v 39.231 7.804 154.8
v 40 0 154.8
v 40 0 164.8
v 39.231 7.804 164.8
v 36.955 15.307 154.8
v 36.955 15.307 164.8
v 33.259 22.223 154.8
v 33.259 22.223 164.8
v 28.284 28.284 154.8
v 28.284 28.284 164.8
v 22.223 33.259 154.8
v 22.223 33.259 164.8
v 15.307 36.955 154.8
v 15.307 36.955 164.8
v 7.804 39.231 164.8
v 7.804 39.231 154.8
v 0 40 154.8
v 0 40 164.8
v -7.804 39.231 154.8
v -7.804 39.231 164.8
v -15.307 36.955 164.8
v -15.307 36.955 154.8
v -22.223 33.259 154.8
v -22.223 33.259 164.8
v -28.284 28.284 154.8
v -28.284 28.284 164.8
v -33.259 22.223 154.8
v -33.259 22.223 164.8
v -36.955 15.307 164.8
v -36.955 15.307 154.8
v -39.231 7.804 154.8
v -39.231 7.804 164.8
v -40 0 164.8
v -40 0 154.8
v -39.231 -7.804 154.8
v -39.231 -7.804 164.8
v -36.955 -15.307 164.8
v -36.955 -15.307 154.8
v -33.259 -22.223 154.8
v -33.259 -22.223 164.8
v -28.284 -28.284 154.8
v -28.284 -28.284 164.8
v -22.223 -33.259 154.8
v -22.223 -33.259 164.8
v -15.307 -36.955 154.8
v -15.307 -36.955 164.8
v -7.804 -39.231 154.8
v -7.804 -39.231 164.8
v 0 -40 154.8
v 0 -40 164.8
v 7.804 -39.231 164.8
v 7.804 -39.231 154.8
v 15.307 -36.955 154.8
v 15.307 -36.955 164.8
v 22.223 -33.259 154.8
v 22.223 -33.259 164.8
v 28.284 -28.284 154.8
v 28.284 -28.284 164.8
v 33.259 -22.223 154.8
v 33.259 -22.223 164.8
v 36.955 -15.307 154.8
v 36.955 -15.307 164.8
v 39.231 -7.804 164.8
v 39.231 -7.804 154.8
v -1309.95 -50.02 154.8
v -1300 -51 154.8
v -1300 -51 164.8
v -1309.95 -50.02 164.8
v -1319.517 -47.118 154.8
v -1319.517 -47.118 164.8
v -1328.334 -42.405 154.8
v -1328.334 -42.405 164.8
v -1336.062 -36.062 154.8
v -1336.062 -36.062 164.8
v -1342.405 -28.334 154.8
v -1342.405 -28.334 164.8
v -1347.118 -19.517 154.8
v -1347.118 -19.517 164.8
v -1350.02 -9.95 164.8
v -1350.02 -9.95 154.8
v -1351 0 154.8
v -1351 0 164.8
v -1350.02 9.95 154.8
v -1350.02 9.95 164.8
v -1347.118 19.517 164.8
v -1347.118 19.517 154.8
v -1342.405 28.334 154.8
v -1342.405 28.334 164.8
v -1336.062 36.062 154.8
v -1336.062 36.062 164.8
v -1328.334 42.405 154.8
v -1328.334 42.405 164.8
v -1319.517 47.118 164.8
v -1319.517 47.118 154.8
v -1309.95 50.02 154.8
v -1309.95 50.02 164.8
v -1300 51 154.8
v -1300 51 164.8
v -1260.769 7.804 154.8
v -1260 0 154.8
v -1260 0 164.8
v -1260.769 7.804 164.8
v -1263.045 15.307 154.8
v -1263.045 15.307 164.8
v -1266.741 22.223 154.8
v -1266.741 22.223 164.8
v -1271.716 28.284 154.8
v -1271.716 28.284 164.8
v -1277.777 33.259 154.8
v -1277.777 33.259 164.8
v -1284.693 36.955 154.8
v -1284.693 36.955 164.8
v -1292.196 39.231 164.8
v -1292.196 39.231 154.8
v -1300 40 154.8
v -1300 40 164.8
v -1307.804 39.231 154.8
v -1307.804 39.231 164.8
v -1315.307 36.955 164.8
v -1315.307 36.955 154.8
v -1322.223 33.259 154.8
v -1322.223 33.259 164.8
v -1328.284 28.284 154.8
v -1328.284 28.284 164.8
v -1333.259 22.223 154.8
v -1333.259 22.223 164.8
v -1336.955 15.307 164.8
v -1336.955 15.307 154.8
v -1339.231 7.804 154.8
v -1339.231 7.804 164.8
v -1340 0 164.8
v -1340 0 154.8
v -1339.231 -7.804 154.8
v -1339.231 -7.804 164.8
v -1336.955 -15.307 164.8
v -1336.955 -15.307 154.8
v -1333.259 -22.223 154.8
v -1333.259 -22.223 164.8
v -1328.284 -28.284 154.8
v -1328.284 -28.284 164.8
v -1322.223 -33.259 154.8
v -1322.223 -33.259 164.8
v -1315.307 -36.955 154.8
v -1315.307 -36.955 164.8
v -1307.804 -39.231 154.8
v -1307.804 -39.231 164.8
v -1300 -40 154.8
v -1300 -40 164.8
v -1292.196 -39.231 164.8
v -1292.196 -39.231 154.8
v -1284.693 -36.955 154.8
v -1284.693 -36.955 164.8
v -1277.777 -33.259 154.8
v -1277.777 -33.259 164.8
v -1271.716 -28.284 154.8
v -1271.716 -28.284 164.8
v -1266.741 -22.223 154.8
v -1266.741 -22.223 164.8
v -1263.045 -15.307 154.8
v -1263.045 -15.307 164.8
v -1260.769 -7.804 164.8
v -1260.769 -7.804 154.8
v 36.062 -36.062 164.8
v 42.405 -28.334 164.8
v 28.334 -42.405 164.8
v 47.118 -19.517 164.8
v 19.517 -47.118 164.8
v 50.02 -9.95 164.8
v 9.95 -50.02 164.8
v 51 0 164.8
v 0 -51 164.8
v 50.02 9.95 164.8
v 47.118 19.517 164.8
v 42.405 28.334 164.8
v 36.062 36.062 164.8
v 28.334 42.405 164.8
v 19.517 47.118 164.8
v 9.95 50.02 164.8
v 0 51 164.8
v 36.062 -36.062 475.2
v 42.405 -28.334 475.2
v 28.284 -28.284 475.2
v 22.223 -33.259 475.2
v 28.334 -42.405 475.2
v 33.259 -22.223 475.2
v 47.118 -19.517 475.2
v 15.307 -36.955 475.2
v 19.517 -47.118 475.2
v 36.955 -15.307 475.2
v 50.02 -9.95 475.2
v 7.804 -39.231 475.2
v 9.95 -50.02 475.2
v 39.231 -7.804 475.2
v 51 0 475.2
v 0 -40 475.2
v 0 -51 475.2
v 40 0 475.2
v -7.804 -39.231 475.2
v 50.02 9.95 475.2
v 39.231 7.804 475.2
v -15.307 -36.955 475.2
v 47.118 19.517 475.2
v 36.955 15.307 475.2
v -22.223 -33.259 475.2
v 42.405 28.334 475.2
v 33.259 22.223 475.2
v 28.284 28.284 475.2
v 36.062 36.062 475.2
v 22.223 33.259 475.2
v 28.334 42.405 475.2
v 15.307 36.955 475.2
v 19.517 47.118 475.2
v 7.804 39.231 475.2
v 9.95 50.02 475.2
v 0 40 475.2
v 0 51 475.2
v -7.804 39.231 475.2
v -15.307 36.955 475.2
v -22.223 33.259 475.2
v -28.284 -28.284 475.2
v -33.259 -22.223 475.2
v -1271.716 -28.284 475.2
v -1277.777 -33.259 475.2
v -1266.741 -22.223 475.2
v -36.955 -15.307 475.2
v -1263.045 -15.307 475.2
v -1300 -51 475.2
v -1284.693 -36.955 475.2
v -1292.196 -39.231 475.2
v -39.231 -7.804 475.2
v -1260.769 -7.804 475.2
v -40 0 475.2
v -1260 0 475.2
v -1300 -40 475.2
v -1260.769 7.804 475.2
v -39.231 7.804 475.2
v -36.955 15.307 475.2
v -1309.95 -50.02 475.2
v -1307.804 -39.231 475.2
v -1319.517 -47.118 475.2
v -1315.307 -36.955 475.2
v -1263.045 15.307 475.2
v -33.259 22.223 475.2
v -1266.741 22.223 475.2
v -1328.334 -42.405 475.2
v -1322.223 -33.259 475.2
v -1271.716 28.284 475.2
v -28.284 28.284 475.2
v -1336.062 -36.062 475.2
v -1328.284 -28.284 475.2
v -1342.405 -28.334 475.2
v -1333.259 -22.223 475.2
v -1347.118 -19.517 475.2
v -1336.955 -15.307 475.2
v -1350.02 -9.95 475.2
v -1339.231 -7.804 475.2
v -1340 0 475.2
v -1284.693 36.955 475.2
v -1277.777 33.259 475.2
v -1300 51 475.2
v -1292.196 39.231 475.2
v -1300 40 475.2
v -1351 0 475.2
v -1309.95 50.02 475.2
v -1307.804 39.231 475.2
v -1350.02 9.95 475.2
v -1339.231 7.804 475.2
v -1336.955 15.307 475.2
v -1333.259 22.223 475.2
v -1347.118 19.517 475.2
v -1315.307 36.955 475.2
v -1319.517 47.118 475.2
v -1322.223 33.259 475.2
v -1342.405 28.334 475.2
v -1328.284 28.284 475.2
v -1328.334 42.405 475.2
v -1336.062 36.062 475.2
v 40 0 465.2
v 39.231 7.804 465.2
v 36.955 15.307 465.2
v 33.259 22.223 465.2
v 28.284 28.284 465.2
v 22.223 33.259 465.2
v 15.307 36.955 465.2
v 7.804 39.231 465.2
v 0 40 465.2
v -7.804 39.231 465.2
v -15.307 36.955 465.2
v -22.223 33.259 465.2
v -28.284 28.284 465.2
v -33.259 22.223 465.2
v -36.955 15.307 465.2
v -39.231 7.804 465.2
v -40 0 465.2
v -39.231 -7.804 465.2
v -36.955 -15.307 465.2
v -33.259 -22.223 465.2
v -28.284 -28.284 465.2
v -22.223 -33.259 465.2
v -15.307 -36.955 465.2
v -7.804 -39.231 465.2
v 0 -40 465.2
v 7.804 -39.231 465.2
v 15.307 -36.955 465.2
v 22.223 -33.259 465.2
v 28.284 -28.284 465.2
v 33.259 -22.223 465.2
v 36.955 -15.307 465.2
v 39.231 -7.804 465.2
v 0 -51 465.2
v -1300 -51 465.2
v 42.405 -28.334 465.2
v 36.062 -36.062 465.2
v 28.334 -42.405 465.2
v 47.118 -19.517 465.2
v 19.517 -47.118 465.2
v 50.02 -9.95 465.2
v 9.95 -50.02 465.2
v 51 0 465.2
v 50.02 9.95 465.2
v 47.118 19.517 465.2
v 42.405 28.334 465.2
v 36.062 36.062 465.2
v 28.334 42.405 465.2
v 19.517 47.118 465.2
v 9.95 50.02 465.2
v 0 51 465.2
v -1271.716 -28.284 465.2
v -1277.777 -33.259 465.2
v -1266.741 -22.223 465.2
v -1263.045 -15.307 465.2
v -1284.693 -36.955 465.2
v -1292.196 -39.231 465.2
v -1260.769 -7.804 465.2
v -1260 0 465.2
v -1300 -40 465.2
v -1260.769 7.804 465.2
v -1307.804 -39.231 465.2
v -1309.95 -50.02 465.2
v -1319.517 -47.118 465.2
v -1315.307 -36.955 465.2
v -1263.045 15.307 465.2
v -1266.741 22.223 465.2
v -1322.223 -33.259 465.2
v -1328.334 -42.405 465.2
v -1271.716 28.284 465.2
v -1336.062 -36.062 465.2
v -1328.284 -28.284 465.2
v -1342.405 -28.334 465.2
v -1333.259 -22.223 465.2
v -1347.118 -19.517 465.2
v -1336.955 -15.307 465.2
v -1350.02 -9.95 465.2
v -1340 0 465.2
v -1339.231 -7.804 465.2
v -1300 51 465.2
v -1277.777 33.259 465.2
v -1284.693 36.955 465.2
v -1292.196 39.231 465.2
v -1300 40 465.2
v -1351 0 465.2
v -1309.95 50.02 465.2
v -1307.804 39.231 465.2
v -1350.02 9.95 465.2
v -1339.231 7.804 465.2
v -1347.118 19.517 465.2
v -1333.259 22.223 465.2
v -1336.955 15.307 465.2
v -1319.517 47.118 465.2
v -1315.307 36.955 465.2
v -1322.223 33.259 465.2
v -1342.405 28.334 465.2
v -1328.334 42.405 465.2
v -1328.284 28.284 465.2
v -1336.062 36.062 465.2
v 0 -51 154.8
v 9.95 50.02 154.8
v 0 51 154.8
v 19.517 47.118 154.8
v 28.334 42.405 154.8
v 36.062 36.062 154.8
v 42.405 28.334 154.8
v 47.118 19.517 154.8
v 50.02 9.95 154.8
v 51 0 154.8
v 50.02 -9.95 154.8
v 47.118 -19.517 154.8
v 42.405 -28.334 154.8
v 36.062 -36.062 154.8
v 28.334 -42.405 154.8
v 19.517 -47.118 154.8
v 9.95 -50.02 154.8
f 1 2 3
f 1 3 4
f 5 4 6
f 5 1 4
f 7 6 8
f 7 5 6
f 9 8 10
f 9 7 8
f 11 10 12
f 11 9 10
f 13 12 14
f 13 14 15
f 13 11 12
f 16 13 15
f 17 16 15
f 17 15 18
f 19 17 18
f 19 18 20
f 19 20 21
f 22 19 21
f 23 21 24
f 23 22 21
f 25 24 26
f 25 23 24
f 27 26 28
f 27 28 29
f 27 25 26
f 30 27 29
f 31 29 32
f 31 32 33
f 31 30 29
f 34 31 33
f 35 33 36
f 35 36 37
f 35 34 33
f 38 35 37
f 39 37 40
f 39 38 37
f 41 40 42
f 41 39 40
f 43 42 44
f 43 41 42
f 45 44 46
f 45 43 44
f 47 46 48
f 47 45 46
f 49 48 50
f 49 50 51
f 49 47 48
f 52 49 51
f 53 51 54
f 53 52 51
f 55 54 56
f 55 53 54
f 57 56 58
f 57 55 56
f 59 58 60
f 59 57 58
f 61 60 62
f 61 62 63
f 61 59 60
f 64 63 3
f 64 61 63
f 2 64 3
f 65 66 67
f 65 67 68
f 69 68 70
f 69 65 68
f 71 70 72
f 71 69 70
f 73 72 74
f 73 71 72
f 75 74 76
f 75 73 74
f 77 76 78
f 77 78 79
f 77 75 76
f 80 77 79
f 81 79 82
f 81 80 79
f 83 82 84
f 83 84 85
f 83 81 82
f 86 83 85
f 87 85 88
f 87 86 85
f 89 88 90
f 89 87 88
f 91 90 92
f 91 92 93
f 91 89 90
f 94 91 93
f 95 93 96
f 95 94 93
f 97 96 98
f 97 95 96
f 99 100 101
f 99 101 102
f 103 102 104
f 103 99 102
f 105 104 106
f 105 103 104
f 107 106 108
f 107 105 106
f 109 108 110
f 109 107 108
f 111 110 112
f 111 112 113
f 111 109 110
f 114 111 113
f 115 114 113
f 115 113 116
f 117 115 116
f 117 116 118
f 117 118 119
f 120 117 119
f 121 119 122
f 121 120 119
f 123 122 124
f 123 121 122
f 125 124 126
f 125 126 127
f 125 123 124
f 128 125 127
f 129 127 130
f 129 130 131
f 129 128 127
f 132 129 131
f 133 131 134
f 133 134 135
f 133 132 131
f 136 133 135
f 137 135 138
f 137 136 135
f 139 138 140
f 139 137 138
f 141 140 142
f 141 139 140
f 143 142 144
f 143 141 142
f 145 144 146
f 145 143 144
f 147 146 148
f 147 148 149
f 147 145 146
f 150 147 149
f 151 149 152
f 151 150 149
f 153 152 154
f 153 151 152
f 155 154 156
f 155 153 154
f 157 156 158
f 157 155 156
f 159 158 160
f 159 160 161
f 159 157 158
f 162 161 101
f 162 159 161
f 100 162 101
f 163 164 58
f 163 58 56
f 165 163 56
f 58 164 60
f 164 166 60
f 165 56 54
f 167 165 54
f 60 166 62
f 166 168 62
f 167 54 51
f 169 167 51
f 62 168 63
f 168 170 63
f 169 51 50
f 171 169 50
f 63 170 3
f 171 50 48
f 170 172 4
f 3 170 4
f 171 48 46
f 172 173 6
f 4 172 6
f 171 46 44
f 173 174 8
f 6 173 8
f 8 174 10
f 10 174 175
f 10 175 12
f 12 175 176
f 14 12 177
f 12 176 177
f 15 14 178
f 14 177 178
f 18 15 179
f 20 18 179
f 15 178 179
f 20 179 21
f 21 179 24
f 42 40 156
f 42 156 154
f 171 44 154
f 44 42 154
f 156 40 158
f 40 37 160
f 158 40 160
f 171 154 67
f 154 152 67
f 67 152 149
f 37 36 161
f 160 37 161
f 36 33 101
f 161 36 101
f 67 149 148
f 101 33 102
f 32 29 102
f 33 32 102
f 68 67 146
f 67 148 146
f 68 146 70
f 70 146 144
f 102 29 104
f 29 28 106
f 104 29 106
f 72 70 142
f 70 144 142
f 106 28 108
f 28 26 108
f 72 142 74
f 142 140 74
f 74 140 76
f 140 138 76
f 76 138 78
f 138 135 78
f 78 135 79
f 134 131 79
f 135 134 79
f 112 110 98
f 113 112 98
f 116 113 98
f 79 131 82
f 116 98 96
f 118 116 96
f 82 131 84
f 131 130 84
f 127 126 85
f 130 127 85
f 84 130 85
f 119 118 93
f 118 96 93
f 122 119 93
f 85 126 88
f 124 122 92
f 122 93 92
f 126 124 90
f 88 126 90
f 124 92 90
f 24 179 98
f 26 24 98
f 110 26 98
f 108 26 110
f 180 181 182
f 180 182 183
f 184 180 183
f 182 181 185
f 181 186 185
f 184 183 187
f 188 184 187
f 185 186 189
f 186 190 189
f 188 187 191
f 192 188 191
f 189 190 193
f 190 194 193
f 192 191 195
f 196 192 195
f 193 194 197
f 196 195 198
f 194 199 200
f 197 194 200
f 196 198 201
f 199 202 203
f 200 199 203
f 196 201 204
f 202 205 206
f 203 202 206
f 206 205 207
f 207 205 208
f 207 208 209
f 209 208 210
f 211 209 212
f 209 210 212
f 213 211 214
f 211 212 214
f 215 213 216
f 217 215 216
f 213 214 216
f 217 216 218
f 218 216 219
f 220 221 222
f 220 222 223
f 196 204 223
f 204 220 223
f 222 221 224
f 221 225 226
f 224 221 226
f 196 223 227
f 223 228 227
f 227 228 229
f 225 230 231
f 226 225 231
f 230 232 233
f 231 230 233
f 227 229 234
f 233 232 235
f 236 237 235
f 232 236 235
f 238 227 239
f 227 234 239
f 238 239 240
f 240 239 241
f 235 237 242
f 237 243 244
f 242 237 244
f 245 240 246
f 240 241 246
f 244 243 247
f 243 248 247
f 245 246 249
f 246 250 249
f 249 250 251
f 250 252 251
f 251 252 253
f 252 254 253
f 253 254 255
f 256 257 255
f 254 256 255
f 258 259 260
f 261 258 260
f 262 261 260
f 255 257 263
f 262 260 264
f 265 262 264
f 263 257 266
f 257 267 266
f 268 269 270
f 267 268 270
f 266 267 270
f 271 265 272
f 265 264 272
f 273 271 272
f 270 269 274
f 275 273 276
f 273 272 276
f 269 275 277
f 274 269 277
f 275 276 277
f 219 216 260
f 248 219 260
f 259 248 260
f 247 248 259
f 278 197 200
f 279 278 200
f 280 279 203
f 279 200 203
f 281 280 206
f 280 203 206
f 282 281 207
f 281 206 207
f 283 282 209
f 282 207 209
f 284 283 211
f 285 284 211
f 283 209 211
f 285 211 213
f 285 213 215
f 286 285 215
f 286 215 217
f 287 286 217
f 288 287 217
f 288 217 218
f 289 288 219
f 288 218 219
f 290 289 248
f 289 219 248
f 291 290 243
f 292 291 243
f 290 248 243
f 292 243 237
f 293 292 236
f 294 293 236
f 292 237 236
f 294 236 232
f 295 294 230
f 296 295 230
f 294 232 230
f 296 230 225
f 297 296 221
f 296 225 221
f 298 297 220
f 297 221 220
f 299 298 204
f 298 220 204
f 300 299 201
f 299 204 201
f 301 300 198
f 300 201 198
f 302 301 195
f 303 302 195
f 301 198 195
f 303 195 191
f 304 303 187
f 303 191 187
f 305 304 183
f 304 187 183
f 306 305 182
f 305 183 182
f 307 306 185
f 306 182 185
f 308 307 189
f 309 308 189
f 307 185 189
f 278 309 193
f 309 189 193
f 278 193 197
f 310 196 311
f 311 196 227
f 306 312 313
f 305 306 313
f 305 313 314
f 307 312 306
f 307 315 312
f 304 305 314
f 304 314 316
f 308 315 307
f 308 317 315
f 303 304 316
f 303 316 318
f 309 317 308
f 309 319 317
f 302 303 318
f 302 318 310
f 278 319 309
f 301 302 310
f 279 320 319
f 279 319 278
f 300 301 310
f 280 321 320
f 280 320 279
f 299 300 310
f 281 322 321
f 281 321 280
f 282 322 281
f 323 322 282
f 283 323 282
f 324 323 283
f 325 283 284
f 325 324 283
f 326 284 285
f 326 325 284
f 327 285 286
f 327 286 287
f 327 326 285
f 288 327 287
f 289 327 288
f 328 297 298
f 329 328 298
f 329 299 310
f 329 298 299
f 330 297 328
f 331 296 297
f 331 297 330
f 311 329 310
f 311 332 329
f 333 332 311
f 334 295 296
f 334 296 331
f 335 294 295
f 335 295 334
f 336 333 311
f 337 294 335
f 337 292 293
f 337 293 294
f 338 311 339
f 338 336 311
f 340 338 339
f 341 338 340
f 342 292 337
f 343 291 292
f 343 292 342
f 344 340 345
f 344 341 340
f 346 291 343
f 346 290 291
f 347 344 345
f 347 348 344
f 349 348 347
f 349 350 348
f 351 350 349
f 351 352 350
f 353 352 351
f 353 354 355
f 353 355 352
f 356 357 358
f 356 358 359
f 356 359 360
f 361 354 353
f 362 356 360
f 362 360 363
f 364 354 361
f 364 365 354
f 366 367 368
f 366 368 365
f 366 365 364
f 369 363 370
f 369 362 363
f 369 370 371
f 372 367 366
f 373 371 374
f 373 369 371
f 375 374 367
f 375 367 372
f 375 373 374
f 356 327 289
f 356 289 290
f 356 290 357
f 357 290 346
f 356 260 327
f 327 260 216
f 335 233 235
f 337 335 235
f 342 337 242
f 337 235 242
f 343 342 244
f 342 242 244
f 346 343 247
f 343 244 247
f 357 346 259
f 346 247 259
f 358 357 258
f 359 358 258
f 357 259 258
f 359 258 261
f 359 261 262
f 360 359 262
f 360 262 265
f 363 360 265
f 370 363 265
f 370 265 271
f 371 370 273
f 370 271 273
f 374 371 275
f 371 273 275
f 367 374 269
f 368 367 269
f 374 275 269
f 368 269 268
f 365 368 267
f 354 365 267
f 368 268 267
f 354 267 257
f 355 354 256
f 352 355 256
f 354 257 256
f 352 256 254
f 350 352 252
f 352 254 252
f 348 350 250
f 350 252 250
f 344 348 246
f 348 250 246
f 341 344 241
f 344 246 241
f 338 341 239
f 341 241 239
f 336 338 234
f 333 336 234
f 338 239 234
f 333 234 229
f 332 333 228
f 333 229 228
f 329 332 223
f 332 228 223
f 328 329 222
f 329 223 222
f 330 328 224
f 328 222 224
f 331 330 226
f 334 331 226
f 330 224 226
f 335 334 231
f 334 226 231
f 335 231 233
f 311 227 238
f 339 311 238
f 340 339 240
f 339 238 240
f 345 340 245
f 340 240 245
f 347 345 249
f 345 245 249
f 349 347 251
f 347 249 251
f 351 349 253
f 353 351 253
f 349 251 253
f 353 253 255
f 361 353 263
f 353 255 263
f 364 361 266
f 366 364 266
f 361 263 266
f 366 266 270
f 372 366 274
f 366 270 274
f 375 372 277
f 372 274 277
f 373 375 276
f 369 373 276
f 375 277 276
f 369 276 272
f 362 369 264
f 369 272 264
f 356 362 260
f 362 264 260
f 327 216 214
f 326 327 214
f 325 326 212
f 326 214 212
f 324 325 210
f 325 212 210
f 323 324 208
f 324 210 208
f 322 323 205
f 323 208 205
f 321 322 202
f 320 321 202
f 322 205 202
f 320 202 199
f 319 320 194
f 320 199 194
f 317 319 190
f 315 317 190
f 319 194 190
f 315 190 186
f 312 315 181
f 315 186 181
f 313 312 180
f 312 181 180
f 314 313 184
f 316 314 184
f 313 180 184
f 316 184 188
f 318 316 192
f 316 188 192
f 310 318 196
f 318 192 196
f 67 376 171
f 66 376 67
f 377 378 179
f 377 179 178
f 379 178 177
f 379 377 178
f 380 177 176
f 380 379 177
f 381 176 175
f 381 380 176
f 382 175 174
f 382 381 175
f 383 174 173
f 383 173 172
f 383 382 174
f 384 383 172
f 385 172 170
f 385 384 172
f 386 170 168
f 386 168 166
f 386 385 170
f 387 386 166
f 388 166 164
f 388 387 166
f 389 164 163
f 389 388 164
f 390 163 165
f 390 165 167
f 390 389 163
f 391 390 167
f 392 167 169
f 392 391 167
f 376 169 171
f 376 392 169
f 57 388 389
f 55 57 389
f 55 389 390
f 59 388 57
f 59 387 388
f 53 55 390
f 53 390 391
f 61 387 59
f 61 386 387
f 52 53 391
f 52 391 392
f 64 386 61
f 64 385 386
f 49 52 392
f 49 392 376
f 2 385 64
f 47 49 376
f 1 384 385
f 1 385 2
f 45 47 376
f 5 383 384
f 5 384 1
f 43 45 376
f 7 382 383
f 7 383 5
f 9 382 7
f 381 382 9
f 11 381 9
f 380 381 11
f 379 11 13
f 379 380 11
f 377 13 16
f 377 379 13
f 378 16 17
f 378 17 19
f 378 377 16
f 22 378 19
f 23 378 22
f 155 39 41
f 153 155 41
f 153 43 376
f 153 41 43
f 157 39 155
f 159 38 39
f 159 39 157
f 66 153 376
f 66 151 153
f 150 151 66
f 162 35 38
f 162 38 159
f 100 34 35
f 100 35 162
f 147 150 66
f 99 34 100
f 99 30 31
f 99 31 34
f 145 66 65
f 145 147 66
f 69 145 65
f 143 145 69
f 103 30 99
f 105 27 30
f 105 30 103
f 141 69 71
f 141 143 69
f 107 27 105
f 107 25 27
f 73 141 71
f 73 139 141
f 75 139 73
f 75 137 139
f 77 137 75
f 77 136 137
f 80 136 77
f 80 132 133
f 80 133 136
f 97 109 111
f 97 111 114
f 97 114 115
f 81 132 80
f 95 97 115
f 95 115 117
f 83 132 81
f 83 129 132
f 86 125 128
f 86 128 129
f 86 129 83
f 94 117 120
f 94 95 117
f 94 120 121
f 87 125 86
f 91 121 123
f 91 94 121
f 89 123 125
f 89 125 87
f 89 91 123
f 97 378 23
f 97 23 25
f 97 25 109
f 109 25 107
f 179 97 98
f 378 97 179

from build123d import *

# Parameters (mm, degrees)
SKETCH1_R           = 40
BOSS_EXTRUDE1_DEPTH = 10


with BuildPart() as part:
    # Sketch1 → Boss-Extrude1 (new body)
    with BuildSketch(Plane.XY):
        with BuildLine():
            Line((0, -51), (-1300, -51))
            ThreePointArc((-1300, -51), (-1351, 0), (-1300, 51))
            Line((-1300, 51), (0, 51))
            ThreePointArc((0, 51), (51, 0), (0, -51))
        make_face()
        Circle(SKETCH1_R, mode=Mode.SUBTRACT)
        with Locations((-1300, 0)):
            Circle(SKETCH1_R, mode=Mode.SUBTRACT)
    extrude(amount=BOSS_EXTRUDE1_DEPTH)


with BuildPart() as body_2:
    # Mirror5: mirrored copy
    add(part.part.mirror(Plane.XY.offset(315)))


with BuildPart() as body_2_1:
    # Move Body 1: moved
    add(body_2.part.moved(Location((0, 0, -113.8))))


with BuildPart() as part_1:
    # Move Body 2: moved
    add(part.part.moved(Location((0, 0, 113.8))))


with BuildPart() as part_2:
    # Move Body 4: moved
    add(part_1.part.moved(Location((0, 0, 41))))


with BuildPart() as body_2_2:
    # Move Body 5: moved
    add(body_2_1.part.moved(Location((0, 0, -41))))


solid = Compound([part_2.part, body_2_2.part])
